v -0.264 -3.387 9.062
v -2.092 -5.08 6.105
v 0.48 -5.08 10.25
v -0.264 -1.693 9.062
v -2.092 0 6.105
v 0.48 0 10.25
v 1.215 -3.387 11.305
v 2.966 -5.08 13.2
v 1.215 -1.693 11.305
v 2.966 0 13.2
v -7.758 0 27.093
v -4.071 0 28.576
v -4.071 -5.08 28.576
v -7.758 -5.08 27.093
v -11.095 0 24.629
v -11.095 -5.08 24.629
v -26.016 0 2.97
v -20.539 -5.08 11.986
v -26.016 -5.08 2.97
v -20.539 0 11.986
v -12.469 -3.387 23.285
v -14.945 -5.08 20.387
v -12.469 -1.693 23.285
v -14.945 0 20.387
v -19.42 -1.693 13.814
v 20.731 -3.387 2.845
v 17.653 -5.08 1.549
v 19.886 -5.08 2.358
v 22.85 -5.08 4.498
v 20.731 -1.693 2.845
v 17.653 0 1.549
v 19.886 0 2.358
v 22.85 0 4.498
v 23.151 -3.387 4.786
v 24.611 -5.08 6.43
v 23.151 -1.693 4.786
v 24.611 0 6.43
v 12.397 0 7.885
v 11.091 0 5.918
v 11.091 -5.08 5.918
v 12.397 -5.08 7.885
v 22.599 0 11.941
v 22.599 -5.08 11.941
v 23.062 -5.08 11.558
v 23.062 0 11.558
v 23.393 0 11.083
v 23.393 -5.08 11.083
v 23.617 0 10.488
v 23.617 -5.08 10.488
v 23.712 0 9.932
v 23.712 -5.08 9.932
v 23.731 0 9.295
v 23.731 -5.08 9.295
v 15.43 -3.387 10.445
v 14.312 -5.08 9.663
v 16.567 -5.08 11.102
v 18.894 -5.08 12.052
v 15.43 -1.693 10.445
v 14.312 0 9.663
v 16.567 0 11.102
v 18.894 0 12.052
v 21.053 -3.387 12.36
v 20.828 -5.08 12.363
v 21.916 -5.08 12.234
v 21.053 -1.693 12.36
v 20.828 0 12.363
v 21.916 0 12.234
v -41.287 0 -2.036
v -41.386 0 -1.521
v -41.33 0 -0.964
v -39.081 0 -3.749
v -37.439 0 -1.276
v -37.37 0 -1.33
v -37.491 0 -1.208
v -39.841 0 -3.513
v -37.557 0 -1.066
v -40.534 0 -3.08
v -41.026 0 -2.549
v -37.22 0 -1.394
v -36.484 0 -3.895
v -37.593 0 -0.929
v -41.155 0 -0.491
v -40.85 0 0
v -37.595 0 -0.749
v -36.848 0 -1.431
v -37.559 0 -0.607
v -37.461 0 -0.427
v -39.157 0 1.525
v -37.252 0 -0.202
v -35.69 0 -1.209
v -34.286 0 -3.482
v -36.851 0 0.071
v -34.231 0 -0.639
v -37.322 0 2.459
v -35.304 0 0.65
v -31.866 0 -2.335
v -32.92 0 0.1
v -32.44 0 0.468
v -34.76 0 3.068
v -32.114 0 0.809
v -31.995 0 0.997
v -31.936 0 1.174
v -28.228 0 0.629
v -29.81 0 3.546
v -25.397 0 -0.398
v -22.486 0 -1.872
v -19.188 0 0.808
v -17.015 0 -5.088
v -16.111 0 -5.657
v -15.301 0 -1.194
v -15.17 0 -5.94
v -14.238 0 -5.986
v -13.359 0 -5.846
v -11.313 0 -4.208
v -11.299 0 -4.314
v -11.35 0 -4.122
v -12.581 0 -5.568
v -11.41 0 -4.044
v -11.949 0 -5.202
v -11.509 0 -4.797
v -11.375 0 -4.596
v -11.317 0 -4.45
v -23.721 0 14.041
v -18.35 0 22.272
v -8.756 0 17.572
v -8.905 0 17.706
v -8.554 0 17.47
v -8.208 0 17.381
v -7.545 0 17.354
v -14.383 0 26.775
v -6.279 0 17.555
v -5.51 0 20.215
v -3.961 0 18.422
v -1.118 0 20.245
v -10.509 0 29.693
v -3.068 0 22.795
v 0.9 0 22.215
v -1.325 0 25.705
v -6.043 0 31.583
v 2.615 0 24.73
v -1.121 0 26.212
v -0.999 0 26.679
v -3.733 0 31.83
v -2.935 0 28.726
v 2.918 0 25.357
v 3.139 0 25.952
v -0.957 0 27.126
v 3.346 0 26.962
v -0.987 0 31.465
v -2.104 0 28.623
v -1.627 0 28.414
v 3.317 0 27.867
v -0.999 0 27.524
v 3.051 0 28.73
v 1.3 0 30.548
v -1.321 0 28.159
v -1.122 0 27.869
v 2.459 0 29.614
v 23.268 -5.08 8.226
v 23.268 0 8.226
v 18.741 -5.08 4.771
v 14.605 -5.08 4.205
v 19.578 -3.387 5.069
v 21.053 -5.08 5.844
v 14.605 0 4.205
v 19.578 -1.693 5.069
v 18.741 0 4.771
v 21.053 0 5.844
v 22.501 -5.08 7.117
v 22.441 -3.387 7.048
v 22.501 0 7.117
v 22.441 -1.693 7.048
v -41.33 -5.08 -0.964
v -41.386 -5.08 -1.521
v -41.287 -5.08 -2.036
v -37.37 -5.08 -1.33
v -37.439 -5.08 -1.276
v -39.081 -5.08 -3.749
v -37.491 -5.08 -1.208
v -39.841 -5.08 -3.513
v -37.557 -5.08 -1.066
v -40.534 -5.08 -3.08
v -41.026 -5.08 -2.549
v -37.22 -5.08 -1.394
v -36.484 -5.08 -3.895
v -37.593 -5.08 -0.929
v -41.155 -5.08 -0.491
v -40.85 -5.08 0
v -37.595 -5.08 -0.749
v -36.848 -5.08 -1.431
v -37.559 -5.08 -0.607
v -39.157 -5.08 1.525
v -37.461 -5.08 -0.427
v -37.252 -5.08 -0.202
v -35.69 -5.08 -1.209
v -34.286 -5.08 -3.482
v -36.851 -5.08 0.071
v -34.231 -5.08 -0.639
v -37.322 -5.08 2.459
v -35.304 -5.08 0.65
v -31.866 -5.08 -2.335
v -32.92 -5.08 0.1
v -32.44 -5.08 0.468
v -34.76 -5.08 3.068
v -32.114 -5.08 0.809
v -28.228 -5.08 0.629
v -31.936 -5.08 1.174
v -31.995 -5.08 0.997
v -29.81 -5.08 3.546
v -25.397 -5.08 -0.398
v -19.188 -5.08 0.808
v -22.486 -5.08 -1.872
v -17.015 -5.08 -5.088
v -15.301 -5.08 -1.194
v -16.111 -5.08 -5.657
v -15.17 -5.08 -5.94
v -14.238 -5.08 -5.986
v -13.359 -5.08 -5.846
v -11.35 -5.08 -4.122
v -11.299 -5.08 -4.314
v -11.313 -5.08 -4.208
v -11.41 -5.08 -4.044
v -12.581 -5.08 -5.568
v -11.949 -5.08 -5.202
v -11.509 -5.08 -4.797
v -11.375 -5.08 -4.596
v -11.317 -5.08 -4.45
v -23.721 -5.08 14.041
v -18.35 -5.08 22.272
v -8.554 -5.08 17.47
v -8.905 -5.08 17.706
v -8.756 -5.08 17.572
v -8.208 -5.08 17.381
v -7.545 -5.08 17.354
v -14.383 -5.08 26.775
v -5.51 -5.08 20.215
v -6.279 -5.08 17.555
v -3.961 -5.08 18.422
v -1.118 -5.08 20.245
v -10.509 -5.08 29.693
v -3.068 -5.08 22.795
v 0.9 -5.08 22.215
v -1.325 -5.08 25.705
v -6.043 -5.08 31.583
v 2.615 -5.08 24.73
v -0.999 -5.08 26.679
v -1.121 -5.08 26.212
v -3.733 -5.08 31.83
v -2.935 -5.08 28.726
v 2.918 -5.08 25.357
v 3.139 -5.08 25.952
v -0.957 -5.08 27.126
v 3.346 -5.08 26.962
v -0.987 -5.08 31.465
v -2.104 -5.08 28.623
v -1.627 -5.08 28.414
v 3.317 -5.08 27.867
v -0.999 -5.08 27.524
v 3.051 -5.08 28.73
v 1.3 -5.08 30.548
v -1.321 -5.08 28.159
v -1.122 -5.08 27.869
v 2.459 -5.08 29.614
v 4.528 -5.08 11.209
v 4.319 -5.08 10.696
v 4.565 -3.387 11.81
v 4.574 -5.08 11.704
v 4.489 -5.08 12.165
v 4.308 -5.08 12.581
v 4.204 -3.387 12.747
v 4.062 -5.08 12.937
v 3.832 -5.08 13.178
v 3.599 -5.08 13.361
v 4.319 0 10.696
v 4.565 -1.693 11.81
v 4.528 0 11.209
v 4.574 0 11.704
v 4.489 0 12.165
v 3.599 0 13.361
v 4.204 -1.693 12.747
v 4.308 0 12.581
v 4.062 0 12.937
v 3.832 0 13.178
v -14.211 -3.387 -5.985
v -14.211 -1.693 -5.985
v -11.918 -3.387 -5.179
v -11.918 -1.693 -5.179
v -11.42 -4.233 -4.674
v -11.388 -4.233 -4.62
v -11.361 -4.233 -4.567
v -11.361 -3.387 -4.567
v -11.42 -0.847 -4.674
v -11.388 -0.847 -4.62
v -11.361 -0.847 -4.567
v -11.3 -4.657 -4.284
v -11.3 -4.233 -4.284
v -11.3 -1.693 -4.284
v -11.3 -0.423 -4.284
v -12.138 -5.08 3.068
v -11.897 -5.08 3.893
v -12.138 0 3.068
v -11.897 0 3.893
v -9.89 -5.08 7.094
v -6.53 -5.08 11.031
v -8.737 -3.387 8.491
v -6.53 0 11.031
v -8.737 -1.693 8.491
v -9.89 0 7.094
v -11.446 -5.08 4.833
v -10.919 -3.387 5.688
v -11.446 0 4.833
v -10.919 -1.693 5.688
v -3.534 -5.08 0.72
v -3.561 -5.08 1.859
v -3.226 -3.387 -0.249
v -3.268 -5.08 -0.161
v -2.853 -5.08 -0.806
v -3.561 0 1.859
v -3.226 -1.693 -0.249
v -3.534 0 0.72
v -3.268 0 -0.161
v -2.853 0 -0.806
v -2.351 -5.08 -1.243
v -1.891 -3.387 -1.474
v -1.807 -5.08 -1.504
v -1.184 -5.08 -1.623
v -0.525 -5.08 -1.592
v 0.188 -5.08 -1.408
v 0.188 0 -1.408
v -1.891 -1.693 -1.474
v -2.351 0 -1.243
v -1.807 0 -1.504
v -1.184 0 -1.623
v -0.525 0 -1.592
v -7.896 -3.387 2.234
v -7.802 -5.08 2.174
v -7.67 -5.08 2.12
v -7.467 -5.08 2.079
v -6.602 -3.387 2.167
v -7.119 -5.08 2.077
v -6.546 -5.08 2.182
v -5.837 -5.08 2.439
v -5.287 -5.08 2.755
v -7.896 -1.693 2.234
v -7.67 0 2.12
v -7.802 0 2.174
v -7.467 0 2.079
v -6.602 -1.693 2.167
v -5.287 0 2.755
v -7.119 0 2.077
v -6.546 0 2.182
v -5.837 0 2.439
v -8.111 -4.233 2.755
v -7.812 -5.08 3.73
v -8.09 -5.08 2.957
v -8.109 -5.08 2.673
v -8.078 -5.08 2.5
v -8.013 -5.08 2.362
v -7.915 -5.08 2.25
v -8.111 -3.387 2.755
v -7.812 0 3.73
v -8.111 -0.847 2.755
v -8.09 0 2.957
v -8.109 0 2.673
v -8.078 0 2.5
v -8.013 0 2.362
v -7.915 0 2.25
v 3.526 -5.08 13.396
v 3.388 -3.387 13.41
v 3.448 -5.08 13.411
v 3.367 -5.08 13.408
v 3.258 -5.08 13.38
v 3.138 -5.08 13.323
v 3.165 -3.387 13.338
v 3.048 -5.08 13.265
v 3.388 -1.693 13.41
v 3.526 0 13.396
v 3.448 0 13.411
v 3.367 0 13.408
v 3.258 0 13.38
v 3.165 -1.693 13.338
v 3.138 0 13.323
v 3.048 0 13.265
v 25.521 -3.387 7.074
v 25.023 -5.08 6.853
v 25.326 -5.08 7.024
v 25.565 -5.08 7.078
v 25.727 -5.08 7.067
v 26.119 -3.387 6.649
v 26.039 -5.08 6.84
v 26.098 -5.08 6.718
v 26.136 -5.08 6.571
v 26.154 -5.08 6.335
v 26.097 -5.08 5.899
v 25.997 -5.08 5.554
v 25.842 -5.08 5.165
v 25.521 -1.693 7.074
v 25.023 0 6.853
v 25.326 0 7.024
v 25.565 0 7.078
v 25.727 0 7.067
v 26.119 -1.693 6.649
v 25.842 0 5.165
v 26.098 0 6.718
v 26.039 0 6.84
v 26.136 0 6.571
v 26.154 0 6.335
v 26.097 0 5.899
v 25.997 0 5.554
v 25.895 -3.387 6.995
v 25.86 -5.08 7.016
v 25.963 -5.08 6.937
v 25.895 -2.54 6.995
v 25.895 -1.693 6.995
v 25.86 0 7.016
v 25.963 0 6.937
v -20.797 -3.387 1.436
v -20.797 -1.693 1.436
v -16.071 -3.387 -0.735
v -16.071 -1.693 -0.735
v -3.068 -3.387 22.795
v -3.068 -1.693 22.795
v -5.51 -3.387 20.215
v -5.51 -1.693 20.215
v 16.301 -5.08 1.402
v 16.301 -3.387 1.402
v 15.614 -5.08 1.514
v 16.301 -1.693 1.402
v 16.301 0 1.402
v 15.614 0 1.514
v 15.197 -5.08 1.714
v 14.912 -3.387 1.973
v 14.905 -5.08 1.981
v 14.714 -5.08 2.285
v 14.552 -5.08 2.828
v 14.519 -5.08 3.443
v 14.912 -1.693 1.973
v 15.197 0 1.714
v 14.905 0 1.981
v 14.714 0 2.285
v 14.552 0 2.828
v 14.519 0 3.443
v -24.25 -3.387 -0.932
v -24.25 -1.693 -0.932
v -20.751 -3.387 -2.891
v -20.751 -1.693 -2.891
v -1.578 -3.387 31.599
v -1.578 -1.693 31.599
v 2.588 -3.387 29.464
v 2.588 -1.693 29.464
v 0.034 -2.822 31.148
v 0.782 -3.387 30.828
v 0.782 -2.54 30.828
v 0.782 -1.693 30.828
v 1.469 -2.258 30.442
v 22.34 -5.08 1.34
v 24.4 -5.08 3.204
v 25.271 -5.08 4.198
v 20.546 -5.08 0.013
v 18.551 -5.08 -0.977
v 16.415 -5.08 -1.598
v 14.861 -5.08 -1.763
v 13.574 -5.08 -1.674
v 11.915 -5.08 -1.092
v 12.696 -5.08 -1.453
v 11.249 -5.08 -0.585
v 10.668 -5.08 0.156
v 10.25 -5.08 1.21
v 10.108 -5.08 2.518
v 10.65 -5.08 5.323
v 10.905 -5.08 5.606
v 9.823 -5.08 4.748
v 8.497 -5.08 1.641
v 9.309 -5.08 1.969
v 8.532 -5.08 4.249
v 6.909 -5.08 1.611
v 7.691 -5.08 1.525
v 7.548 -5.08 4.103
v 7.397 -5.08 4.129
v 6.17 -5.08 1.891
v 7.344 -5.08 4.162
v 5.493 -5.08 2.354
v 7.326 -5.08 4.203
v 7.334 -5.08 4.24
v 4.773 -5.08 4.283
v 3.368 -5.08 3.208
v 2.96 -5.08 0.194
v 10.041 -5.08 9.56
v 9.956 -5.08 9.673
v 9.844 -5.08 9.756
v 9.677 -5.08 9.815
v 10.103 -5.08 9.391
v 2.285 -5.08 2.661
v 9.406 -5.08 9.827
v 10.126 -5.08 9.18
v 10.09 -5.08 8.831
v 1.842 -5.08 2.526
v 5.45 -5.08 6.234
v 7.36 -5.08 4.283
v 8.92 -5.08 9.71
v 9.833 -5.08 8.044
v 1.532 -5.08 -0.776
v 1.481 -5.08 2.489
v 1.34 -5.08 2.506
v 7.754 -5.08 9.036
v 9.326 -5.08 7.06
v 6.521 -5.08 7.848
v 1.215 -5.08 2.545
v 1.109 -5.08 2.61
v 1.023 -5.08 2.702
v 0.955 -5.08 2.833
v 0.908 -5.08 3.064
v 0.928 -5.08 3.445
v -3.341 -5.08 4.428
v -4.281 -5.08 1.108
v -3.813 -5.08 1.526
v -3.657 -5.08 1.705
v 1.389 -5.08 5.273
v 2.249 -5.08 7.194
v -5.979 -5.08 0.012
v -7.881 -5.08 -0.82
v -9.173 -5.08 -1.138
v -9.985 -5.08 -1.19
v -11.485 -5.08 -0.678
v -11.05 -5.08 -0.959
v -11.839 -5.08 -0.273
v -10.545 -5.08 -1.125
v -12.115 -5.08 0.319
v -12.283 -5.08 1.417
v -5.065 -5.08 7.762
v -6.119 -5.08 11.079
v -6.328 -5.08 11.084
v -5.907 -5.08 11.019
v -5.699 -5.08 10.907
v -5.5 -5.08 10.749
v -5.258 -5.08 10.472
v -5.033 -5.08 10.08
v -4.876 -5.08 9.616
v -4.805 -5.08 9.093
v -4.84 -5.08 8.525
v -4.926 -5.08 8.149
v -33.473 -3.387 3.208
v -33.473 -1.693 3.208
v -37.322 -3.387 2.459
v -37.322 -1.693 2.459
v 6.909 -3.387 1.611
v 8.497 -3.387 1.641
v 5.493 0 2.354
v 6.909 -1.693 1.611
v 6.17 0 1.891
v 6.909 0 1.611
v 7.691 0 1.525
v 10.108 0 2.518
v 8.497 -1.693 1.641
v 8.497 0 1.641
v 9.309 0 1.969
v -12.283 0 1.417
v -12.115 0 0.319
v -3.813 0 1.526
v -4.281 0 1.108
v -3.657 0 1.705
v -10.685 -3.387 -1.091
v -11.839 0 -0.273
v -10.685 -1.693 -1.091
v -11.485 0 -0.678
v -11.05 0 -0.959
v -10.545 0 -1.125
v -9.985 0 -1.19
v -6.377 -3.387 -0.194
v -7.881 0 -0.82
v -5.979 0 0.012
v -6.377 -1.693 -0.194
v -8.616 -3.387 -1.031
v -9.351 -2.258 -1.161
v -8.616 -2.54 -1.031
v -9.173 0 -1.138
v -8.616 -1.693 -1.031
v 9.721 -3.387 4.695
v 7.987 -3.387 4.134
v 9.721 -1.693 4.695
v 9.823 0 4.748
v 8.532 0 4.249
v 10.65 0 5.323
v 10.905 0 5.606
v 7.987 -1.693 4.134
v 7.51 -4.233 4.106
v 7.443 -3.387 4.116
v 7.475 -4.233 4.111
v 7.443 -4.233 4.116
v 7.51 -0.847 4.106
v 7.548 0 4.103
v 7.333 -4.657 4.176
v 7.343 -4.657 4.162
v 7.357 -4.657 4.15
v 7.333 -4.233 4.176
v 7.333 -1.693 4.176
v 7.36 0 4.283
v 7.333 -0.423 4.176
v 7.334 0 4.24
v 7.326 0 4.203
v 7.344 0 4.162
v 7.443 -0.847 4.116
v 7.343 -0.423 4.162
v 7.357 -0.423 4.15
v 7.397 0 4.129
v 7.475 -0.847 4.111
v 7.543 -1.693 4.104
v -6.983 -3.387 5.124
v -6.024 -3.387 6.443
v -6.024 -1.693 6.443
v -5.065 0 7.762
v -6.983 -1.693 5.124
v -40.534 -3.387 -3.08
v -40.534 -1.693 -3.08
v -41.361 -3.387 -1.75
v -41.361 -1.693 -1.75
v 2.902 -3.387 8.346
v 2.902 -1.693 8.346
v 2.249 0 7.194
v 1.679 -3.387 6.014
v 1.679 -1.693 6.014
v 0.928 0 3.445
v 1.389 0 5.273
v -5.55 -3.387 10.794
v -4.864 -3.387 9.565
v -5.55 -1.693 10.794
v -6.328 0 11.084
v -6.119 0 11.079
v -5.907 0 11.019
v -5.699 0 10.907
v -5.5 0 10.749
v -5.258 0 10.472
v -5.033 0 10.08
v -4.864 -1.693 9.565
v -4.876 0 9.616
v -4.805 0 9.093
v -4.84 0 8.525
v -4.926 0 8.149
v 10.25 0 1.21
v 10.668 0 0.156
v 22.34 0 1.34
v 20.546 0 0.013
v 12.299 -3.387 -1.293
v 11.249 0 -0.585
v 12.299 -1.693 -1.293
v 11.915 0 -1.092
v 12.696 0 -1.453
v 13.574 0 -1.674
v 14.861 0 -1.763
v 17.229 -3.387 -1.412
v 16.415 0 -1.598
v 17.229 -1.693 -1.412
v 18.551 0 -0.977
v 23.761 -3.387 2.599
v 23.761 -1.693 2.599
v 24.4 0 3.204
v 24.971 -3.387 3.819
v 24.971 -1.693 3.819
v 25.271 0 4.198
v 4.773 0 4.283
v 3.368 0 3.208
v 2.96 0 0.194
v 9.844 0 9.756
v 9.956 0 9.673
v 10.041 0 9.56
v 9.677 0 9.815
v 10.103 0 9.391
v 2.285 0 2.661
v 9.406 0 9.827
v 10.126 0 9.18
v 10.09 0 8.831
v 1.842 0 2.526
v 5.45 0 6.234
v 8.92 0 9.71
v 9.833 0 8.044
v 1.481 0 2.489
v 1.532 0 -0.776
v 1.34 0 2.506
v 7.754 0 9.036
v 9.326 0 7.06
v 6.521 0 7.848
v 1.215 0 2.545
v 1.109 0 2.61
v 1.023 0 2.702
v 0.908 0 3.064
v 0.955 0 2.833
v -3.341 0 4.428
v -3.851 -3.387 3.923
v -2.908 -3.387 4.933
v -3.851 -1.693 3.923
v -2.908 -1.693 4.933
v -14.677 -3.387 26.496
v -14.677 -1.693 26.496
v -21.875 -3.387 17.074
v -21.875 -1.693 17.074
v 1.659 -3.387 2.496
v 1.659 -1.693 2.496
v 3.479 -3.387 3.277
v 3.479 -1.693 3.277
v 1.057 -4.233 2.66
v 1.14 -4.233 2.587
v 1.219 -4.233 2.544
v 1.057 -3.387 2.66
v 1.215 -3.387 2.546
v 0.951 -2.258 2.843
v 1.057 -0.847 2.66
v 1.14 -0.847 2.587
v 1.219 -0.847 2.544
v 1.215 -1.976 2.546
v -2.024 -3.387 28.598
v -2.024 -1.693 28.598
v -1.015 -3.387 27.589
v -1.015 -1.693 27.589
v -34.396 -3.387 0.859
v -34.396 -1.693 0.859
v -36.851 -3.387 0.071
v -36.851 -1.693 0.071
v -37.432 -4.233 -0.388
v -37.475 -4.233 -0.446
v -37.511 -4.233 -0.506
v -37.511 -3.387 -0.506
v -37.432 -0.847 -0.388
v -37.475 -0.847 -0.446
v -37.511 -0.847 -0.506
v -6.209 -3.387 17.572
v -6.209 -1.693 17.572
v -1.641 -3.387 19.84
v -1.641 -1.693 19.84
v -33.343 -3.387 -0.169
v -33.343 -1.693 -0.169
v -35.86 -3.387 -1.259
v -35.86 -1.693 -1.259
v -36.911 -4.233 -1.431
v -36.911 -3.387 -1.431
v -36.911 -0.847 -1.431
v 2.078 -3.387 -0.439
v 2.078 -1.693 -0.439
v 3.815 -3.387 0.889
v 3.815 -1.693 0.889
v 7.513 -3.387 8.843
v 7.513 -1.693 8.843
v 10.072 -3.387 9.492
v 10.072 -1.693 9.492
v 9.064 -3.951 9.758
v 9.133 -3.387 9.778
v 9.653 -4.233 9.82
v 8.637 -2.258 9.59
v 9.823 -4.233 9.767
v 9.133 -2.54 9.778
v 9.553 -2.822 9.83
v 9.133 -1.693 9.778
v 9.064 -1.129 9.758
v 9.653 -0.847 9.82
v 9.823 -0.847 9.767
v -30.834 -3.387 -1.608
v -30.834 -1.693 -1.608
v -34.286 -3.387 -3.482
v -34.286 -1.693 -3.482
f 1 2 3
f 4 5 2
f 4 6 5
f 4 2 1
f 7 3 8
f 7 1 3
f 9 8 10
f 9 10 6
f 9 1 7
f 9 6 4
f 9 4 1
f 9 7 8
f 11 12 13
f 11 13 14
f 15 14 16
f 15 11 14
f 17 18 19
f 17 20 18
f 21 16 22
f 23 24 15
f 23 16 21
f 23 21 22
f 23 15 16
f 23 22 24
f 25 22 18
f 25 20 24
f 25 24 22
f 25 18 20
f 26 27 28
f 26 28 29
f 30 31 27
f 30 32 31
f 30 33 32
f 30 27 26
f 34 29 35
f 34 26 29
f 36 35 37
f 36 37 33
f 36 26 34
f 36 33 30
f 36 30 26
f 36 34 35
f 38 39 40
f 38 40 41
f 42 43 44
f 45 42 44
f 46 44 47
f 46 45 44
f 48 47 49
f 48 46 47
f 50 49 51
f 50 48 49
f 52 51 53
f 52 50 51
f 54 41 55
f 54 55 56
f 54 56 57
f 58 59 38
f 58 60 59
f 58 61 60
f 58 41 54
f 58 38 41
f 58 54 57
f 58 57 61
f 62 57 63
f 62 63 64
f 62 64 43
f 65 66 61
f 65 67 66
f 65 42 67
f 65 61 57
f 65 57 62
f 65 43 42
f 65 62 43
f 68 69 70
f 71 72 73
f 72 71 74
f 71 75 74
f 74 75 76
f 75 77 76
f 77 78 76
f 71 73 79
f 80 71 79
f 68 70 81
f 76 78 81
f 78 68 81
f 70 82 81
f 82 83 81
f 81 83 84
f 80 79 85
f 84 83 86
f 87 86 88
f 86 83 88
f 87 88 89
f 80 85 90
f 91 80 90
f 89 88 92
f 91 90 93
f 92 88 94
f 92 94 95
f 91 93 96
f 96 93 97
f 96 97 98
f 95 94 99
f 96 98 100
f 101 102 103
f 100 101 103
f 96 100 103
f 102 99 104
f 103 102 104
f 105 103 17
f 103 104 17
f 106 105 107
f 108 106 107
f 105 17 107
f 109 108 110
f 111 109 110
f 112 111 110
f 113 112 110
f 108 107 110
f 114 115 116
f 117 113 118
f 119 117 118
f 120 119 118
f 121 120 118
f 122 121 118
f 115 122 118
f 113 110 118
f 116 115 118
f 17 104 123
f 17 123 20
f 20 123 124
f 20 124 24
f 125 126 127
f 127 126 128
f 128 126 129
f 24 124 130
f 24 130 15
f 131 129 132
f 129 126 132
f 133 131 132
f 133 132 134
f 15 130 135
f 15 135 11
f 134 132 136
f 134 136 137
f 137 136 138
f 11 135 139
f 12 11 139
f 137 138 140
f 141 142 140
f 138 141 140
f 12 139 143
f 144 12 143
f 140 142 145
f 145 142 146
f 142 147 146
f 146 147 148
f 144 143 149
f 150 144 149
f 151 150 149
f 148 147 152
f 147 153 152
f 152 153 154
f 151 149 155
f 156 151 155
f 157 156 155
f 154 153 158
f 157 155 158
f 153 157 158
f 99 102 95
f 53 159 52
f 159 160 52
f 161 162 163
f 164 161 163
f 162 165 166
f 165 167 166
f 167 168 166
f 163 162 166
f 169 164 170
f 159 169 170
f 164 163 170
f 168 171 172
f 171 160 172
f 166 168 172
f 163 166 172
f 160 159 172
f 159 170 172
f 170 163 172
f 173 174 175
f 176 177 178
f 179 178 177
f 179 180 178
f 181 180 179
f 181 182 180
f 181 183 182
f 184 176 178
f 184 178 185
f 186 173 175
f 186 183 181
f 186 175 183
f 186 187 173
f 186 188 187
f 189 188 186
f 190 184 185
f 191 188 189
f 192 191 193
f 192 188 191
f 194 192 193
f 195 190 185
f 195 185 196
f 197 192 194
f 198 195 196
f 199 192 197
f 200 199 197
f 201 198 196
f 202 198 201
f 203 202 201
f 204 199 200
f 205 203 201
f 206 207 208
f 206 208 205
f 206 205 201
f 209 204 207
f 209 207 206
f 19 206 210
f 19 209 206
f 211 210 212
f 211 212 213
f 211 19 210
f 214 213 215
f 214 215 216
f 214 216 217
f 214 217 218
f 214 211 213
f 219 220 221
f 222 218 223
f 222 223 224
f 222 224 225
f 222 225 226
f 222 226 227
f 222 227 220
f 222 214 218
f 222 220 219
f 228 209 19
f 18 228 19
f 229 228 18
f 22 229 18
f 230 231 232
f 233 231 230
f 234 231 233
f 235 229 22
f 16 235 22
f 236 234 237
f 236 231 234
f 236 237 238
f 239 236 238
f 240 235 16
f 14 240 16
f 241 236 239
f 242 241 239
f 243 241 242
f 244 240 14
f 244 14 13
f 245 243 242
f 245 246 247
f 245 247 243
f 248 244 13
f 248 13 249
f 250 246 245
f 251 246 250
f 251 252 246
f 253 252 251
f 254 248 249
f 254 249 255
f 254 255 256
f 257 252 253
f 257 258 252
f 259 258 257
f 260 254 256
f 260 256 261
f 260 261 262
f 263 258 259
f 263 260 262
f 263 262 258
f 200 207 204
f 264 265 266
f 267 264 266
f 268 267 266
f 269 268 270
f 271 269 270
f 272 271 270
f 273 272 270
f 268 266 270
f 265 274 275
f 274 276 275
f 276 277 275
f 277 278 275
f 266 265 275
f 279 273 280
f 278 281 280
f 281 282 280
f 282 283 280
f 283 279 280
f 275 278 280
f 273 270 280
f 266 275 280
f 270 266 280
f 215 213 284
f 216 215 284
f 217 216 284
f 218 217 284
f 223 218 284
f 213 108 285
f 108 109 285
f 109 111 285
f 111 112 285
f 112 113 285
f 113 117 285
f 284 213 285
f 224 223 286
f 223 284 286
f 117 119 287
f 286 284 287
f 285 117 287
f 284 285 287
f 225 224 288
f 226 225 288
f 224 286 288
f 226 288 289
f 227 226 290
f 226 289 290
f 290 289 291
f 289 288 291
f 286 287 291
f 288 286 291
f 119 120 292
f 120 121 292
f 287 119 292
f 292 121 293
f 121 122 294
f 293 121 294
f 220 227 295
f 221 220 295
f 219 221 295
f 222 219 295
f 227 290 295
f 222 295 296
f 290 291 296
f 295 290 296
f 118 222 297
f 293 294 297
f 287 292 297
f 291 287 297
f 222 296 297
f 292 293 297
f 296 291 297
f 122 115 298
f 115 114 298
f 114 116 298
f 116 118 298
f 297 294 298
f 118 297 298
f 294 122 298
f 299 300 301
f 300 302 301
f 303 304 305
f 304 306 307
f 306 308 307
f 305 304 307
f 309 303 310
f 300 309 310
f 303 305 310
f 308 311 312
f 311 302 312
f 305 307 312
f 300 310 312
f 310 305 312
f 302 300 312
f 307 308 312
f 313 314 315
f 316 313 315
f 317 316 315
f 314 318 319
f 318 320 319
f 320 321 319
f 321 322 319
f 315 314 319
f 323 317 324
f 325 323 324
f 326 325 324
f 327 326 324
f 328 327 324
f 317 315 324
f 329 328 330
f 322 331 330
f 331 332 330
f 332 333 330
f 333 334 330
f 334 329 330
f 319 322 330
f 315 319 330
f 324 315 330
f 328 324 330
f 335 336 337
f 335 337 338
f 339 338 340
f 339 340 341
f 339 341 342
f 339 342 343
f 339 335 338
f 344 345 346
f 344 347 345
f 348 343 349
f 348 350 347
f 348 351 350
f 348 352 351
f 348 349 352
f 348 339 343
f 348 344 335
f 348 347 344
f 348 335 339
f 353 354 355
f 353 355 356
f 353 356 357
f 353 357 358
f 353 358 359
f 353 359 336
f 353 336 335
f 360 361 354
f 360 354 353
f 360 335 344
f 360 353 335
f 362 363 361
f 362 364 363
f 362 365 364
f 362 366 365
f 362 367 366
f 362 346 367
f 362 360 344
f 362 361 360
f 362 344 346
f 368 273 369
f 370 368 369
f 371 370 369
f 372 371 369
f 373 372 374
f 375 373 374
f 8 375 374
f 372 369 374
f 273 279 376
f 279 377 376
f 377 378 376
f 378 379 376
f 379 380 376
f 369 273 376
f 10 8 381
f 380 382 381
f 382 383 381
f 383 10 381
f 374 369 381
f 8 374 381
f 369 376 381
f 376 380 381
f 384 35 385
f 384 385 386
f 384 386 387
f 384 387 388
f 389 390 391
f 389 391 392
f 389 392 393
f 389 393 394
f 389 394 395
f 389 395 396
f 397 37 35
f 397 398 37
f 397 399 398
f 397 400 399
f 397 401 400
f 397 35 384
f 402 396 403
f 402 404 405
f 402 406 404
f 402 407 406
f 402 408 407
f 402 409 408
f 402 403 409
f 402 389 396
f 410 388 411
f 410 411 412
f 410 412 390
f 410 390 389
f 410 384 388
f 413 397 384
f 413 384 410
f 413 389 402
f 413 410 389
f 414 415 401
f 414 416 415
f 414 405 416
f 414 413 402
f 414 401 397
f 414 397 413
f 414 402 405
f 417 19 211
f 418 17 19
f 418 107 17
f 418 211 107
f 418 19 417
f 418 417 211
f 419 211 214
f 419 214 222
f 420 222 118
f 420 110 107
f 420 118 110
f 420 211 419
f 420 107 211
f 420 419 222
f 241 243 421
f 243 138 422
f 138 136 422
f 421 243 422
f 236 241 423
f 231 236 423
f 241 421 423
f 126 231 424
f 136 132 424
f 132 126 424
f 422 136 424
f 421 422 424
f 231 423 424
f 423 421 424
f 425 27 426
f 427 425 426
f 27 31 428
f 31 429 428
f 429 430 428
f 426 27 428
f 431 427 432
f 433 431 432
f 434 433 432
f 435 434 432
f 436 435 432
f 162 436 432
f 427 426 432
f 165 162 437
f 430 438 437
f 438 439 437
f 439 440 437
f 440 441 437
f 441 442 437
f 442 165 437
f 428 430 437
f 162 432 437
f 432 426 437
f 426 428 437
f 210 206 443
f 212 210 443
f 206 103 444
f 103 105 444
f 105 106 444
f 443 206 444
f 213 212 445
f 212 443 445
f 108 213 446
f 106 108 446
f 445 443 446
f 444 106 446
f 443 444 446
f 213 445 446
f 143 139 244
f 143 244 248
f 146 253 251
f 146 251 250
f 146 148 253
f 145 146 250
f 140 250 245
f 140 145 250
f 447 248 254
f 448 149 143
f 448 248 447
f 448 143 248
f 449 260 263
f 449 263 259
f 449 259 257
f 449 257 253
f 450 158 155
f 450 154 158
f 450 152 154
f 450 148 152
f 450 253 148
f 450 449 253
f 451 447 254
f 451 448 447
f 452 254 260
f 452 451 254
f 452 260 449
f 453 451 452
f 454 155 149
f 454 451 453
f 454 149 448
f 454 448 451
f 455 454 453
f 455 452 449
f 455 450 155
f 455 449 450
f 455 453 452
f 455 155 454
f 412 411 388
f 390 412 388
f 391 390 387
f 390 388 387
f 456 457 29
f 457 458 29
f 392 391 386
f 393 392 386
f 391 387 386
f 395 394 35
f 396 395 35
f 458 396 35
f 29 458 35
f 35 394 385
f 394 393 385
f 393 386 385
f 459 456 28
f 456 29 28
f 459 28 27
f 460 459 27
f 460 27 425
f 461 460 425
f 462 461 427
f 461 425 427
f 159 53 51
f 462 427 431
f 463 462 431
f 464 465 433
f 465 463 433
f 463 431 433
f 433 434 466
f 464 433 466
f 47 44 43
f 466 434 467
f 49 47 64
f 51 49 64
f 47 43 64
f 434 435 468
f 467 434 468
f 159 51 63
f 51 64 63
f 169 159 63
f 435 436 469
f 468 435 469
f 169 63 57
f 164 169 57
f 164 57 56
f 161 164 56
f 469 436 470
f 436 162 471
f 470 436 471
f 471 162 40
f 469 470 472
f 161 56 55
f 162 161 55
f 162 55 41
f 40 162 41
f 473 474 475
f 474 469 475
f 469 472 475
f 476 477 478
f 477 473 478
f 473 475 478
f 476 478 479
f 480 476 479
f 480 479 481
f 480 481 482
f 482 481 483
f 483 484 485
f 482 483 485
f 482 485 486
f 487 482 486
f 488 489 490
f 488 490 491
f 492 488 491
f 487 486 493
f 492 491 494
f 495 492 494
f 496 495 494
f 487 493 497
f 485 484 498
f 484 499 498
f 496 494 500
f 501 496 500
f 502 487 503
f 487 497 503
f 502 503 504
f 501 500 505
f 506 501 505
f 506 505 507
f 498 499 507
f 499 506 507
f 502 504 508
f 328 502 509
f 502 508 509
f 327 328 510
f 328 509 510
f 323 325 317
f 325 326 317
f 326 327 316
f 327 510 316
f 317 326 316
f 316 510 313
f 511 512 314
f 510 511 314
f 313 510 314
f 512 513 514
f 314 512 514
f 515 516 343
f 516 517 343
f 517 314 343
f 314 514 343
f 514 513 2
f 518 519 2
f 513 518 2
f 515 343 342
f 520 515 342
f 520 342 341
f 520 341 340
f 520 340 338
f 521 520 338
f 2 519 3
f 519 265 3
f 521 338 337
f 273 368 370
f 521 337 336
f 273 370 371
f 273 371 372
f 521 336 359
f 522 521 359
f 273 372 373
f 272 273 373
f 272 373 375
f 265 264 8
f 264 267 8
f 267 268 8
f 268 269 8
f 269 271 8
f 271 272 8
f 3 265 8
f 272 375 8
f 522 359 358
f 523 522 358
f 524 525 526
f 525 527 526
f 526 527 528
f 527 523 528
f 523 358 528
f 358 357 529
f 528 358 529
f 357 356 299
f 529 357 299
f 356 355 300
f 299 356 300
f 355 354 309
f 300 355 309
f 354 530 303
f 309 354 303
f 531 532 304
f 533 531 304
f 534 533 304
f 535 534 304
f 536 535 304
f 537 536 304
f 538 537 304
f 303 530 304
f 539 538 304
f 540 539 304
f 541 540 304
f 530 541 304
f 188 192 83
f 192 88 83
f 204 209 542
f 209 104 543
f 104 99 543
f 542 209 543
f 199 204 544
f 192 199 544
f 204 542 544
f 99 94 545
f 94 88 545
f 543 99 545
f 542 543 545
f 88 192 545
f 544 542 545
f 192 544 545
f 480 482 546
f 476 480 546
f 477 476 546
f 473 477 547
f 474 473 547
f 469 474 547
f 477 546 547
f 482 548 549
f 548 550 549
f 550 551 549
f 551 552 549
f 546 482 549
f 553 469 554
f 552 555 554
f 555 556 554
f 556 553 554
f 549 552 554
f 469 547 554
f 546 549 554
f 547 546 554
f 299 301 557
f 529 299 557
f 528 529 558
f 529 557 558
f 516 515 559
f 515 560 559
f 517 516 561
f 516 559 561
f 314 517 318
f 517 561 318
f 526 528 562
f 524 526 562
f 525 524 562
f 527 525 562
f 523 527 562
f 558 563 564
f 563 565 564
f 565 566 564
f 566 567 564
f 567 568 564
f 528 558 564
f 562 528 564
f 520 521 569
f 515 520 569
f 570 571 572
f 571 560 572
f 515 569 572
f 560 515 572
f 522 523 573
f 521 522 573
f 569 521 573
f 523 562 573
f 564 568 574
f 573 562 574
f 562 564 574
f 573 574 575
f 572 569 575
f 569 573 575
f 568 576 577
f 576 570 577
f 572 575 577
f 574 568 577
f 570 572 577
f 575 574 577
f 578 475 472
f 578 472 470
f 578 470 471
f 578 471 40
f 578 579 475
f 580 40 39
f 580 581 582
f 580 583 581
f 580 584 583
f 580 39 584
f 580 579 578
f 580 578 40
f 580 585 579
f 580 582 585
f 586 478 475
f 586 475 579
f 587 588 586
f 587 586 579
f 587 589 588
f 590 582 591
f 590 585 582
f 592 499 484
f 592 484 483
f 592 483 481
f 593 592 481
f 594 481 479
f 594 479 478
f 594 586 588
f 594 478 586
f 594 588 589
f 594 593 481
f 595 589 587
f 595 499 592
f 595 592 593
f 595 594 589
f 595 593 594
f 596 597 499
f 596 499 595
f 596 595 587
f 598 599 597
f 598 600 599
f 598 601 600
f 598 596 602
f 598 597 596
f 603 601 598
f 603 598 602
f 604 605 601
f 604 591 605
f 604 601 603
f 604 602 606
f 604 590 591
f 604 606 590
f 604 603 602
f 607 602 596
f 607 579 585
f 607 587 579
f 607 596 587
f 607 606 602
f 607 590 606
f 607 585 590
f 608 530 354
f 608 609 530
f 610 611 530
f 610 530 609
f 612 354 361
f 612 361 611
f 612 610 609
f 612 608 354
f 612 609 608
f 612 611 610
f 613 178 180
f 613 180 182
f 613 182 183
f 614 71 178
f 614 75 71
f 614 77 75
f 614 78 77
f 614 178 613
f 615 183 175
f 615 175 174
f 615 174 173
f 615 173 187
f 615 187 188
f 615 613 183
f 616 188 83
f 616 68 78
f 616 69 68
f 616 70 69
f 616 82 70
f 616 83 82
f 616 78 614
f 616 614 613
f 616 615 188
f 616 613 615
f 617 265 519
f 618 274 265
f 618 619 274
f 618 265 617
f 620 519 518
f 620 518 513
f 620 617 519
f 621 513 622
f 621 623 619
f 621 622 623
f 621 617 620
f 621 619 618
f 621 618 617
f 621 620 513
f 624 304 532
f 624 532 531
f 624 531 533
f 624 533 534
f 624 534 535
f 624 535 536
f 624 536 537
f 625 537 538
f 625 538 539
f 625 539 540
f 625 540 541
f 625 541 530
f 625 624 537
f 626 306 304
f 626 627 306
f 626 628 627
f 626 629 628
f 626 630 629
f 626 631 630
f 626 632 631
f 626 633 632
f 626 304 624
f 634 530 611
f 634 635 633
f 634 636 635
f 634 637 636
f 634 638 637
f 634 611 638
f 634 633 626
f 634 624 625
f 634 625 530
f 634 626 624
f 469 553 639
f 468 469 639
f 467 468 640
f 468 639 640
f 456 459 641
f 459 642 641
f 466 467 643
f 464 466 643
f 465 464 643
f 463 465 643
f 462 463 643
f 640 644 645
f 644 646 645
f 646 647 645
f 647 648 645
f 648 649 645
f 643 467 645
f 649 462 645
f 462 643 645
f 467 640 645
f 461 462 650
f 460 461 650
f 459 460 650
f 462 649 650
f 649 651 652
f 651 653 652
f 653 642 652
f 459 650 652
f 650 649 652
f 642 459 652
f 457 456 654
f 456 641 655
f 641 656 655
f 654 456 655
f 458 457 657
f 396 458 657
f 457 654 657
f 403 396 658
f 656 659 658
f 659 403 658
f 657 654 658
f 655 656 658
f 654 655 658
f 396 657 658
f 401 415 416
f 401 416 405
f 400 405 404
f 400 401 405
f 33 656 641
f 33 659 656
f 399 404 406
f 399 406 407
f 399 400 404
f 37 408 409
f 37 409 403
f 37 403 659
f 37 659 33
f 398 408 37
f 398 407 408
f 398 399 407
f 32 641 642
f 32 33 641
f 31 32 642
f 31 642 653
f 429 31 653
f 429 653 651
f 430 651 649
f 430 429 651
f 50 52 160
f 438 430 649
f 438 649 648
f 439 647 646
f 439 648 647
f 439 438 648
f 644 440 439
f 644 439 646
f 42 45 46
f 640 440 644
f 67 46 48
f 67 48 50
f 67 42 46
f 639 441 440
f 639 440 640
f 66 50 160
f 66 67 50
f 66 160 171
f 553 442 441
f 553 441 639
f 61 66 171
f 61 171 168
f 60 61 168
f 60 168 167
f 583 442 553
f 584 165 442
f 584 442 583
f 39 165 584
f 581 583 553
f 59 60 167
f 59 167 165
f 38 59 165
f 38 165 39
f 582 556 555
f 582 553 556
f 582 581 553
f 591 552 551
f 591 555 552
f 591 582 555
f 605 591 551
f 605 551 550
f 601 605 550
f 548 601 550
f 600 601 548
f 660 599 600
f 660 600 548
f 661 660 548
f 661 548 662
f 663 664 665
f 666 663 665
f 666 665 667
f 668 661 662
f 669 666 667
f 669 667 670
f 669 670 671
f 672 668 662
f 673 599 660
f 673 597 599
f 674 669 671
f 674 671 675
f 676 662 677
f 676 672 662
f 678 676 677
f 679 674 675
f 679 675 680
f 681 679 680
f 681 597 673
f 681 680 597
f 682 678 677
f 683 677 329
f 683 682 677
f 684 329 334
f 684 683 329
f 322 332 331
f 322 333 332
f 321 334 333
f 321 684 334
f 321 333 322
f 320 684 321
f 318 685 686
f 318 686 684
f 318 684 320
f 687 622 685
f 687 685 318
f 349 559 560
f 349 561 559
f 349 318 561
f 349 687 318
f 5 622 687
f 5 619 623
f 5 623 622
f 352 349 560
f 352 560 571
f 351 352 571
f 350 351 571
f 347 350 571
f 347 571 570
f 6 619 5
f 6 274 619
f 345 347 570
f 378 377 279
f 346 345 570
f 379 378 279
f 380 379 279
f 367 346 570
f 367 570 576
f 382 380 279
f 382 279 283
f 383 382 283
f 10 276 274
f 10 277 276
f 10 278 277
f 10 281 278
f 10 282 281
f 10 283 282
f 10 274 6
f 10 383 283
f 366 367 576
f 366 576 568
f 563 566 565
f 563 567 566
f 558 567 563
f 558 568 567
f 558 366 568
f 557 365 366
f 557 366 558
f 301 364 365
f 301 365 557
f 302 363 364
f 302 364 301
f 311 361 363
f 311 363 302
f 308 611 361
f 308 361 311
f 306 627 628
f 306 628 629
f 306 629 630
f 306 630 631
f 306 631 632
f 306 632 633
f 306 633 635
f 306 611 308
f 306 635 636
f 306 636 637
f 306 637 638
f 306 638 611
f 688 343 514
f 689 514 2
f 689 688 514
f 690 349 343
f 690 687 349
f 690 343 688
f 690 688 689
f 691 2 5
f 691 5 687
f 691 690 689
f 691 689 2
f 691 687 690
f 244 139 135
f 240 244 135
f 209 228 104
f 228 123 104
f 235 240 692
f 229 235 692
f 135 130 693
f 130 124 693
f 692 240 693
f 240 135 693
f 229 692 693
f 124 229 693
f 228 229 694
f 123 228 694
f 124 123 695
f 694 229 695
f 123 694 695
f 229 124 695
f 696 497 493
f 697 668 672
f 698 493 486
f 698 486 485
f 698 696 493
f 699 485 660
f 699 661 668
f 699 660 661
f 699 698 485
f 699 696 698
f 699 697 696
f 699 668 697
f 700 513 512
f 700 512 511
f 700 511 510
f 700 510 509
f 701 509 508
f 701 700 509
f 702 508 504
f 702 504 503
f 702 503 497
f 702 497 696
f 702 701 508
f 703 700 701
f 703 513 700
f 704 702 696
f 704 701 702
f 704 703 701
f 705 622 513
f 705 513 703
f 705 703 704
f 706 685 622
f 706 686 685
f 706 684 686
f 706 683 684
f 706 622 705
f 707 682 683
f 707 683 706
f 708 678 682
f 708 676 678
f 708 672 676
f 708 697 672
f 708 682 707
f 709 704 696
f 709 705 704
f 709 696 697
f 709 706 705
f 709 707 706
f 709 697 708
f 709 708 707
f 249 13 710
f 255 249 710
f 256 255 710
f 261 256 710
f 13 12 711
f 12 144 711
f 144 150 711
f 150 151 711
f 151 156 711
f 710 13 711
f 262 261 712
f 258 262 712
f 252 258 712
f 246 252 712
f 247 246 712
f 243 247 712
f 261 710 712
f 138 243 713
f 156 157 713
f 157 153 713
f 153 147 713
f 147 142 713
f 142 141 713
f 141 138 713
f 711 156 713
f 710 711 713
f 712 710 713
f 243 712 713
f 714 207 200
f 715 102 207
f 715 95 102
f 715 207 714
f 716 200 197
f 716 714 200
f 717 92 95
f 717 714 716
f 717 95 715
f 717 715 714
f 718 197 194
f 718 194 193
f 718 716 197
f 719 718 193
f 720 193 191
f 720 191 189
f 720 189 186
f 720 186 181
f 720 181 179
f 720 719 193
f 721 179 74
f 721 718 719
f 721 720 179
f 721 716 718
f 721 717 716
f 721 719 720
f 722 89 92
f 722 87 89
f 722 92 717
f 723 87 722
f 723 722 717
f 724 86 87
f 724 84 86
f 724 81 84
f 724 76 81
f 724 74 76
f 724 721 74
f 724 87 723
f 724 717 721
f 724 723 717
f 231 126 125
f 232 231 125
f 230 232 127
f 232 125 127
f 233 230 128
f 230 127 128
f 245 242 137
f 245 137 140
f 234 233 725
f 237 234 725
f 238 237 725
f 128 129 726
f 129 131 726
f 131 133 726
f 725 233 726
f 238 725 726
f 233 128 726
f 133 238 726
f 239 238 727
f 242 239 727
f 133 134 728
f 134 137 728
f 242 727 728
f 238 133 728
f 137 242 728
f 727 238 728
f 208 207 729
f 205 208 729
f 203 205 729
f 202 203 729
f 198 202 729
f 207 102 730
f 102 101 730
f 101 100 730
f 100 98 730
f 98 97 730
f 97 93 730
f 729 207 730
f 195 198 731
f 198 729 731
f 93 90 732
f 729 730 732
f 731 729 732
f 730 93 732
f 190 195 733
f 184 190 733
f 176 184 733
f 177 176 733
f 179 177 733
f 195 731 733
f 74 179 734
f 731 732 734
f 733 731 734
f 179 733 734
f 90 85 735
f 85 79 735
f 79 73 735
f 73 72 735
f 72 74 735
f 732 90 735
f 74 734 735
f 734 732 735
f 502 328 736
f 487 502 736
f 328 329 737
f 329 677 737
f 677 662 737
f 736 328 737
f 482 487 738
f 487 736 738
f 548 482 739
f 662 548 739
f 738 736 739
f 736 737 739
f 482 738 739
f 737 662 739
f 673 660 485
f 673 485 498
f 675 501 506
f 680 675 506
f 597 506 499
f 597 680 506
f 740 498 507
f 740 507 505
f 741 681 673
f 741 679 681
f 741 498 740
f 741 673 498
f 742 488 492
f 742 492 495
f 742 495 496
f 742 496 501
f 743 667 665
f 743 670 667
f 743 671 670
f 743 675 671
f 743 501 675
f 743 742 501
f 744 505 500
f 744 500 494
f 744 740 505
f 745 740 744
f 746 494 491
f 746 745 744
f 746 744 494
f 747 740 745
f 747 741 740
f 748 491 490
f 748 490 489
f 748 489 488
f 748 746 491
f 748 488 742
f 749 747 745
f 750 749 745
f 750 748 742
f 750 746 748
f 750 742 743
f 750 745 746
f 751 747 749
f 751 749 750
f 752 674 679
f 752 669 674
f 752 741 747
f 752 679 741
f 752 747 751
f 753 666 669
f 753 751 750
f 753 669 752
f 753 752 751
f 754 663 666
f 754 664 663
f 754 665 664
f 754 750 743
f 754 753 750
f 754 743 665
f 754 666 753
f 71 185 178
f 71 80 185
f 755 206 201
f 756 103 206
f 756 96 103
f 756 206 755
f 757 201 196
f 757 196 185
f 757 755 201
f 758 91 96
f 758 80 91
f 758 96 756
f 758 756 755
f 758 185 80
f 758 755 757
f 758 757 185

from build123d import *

# Parameters (mm, degrees)
F1_DEPTH = 5.08
F3_DEPTH = 5.08


with BuildPart() as f1:
    # F0 (on Front) → F1 (new body)
    with BuildSketch(Plane.XZ):
        with BuildLine():
            add(Edge.make_bspline(
                [(-1.324513, 25.70522), (-2.801984, 22.545209), (-4.950751, 20.264233), (-8.904721, 17.705781)],
                knots=[0, 0, 0, 0, 11.020461, 11.020461, 11.020461, 11.020461], degree=3))
            add(Edge.make_bspline(
                [(-8.904721, 17.705781), (-7.873991, 16.446002), (-0.755446, 18.453902), (2.614936, 24.729785)],
                knots=[0, 0, 0, 0, 13.492187, 13.492187, 13.492187, 13.492187], degree=3))
            add(Edge.make_bspline(
                [(-6.043184, 31.582531), (-2.707249, 32.523745), (5.936177, 30.914163), (2.614936, 24.729785)],
                knots=[0, 0, 0, 0, 11.041882, 11.041882, 11.041882, 11.041882], degree=3))
            add(Edge.make_bspline(
                [(-6.043184, 31.582531), (-16.118718, 28.739778), (-20.783211, 19.049494), (-29.809598, 3.546224)],
                knots=[0, 0, 0, 0, 36.754278, 36.754278, 36.754278, 36.754278], degree=3))
            add(Edge.make_bspline(
                [(-29.809598, 3.546224), (-33.211578, 2.978871), (-37.65085, 3.748198), (-40.84963, 0)],
                knots=[0, 0, 0, 0, 11.595603, 11.595603, 11.595603, 11.595603], degree=3))
            add(Edge.make_bspline(
                [(-39.0807, -3.749497), (-40.609037, -3.491419), (-42.266812, -1.880036), (-40.84963, 0)],
                knots=[0, 0, 0, 0, 4.145822, 4.145822, 4.145822, 4.145822], degree=3))
            add(Edge.make_bspline(
                [(-28.227916, 0.628786), (-30.575689, -1.37541), (-33.448957, -4.700487), (-39.0807, -3.749497)],
                knots=[0, 0, 0, 0, 11.702662, 11.702662, 11.702662, 11.702662], degree=3))
            add(Edge.make_bspline(
                [(-28.227916, 0.628786), (-23.771785, -0.67878), (-21.109067, -2.826134), (-17.014779, -5.088013)],
                knots=[0, 0, 0, 0, 12.586351, 12.586351, 12.586351, 12.586351], degree=3))
            add(Edge.make_bspline(
                [(-17.014779, -5.088013), (-14.380691, -7.292629), (-10.601348, -4.887593), (-11.409713, -4.043678)],
                knots=[0, 0, 0, 0, 5.701526, 5.701526, 5.701526, 5.701526], degree=3))
            add(Edge.make_bspline(
                [(-26.016446, 2.969934), (-20.406444, 1.589058), (-16.181892, 0), (-11.409713, -4.043678)],
                knots=[0, 0, 0, 0, 16.203315, 16.203315, 16.203315, 16.203315], degree=3))
            add(Edge.make_bspline(
                [(-4.070902, 28.575774), (-13.55645, 26.31148), (-19.23367, 13.564208), (-26.016446, 2.969934)],
                knots=[0, 0, 0, 0, 33.723374, 33.723374, 33.723374, 33.723374], degree=3))
            add(Edge.make_bspline(
                [(-4.070902, 28.575774), (-1.597192, 29.166274), (-0.263976, 27.973495), (-1.324513, 25.70522)],
                knots=[0, 0, 0, 0, 3.972749, 3.972749, 3.972749, 3.972749], degree=3))
        make_face()
        with BuildLine():
            add(Edge.make_bspline(
                [(-31.935908, 1.173504), (-33.793658, 1.089822), (-38.362958, 0.322711), (-37.49077, -1.207798)],
                knots=[0, 0, 0, 0, 6.043765, 6.043765, 6.043765, 6.043765], degree=3))
            add(Edge.make_bspline(
                [(-31.935908, 1.173504), (-32.122403, 0), (-36.968427, -2.124403), (-37.49077, -1.207798)],
                knots=[0, 0, 0, 0, 6.043765, 6.043765, 6.043765, 6.043765], degree=3))
        make_face(mode=Mode.SUBTRACT)
    extrude(amount=F1_DEPTH)


with BuildPart() as f3:
    # F2 (on Front) → F3 (new body, through all)
    with BuildSketch(Plane.XZ):
        with BuildLine():
            add(Edge.make_bspline(
                [(-6.529962, 11.030978), (-5.599444, 11.429772), (-4.223298, 9.711762), (-5.065195, 7.762105)],
                knots=[0, 0, 0, 0, 3.582048, 3.582048, 3.582048, 3.582048], degree=3))
            add(Edge.make_bspline(
                [(-6.529962, 11.030978), (-8.435308, 8.771149), (-11.714277, 5.44787), (-12.138262, 3.067929)],
                knots=[0, 0, 0, 0, 9.739773, 9.739773, 9.739773, 9.739773], degree=3))
            add(Edge.make_bspline(
                [(-12.138262, 3.067929), (-13.56139, -4.920452), (-4.181512, 0.529417), (-3.561166, 1.858729)],
                knots=[0, 0, 0, 0, 8.661914, 8.661914, 8.661914, 8.661914], degree=3))
            add(Edge.make_bspline(
                [(-3.561166, 1.858729), (-3.809796, -0.554642), (-2.178719, -2.25616), (0.188285, -1.407566)],
                knots=[0, 0, 0, 0, 4.972632, 4.972632, 4.972632, 4.972632], degree=3))
            add(Edge.make_bspline(
                [(0.188285, -1.407566), (2.185756, -0.691454), (3.812834, 0.893544), (5.49265, 2.354115)],
                knots=[0, 0, 0, 0, 6.50281, 6.50281, 6.50281, 6.50281], degree=3))
            add(Edge.make_bspline(
                [(5.49265, 2.354115), (6.773624, 1.249161), (8.535437, 1.192328), (10.107808, 2.518424)],
                knots=[0, 0, 0, 0, 4.618081, 4.618081, 4.618081, 4.618081], degree=3))
            add(Edge.make_bspline(
                [(10.107808, 2.518424), (10.07741, -3.412867), (17.990364, -2.574516), (22.339994, 1.340152)],
                knots=[0, 0, 0, 0, 12.288804, 12.288804, 12.288804, 12.288804], degree=3))
            add(Edge.make_bspline(
                [(22.339994, 1.340152), (23.822591, 2.67449), (25.183951, 3.699856), (25.841774, 5.164942)],
                knots=[0, 0, 0, 0, 5.1857, 5.1857, 5.1857, 5.1857], degree=3))
            add(Edge.make_bspline(
                [(24.61057, 6.430138), (25.490304, 7.611705), (26.744503, 7.175473), (25.841774, 5.164942)],
                knots=[0, 0, 0, 0, 1.765386, 1.765386, 1.765386, 1.765386], degree=3))
            add(Edge.make_bspline(
                [(17.652975, 1.549193), (20.960761, 2.208865), (23.730582, 5.24823), (24.61057, 6.430138)],
                knots=[0, 0, 0, 0, 8.498927, 8.498927, 8.498927, 8.498927], degree=3))
            add(Edge.make_bspline(
                [(17.652975, 1.549193), (16.694377, 1.358019), (13.996438, 0.827415), (14.604981, 4.204826)],
                knots=[0, 0, 0, 0, 4.042605, 4.042605, 4.042605, 4.042605], degree=3))
            add(Edge.make_bspline(
                [(14.604981, 4.204826), (20.813771, 4.229018), (23.04725, 7.197002), (23.730582, 9.295059)],
                knots=[0, 0, 0, 0, 10.449261, 10.449261, 10.449261, 10.449261], degree=3))
            add(Edge.make_bspline(
                [(11.091067, 5.917699), (13.379047, 10.961175), (23.935271, 15.640404), (23.730582, 9.295059)],
                knots=[0, 0, 0, 0, 13.082962, 13.082962, 13.082962, 13.082962], degree=3))
            add(Edge.make_bspline(
                [(7.360487, 4.282658), (6.942905, 3.761677), (10.39417, 4.381505), (11.091067, 5.917699)],
                knots=[0, 0, 0, 0, 4.073154, 4.073154, 4.073154, 4.073154], degree=3))
            add(Edge.make_bspline(
                [(4.772695, 4.282658), (5.906395, 10.14832), (14.40477, 13.07118), (7.360487, 4.282658)],
                knots=[0, 0, 0, 0, 2.587792, 2.587792, 2.587792, 2.587792], degree=3))
            add(Edge.make_bspline(
                [(0.927975, 3.444706), (0.577201, 1.12927), (4.279783, 3.666517), (4.772695, 4.282658)],
                knots=[0, 0, 0, 0, 3.934975, 3.934975, 3.934975, 3.934975], degree=3))
            add(Edge.make_bspline(
                [(4.319324, 10.69557), (2.899626, 8.250606), (1.348228, 6.218763), (0.927975, 3.444706)],
                knots=[0, 0, 0, 0, 8.004766, 8.004766, 8.004766, 8.004766], degree=3))
            add(Edge.make_bspline(
                [(4.319324, 10.69557), (4.989038, 11.848931), (4.205845, 12.957923), (3.59896, 13.360918)],
                knots=[0, 0, 0, 0, 2.760978, 2.760978, 2.760978, 2.760978], degree=3))
            add(Edge.make_bspline(
                [(3.59896, 13.360918), (3.405378, 13.489463), (3.140711, 13.353076), (2.966232, 13.1996)],
                knots=[0, 0, 0, 0, 0.652969, 0.652969, 0.652969, 0.652969], degree=3))
            add(Edge.make_bspline(
                [(-2.091801, 6.105109), (0.116301, 9.539208), (0.873309, 11.358624), (2.966232, 13.1996)],
                knots=[0, 0, 0, 0, 8.71295, 8.71295, 8.71295, 8.71295], degree=3))
            add(Edge.make_bspline(
                [(-5.286747, 2.755032), (-3.481866, 4.110201), (-2.966992, 4.743989), (-2.091801, 6.105109)],
                knots=[0, 0, 0, 0, 4.62933, 4.62933, 4.62933, 4.62933], degree=3))
            add(Edge.make_bspline(
                [(-7.812439, 3.72986), (-9.035967, 1.261889), (-6.161904, 2.097933), (-5.286747, 2.755032)],
                knots=[0, 0, 0, 0, 2.707289, 2.707289, 2.707289, 2.707289], degree=3))
            add(Edge.make_bspline(
                [(-5.065195, 7.762105), (-5.980943, 6.418024), (-7.090039, 5.187011), (-7.812439, 3.72986)],
                knots=[0, 0, 0, 0, 4.879175, 4.879175, 4.879175, 4.879175], degree=3))
        make_face()
    extrude(amount=F3_DEPTH)


solid = Compound([f1.part, f3.part])
